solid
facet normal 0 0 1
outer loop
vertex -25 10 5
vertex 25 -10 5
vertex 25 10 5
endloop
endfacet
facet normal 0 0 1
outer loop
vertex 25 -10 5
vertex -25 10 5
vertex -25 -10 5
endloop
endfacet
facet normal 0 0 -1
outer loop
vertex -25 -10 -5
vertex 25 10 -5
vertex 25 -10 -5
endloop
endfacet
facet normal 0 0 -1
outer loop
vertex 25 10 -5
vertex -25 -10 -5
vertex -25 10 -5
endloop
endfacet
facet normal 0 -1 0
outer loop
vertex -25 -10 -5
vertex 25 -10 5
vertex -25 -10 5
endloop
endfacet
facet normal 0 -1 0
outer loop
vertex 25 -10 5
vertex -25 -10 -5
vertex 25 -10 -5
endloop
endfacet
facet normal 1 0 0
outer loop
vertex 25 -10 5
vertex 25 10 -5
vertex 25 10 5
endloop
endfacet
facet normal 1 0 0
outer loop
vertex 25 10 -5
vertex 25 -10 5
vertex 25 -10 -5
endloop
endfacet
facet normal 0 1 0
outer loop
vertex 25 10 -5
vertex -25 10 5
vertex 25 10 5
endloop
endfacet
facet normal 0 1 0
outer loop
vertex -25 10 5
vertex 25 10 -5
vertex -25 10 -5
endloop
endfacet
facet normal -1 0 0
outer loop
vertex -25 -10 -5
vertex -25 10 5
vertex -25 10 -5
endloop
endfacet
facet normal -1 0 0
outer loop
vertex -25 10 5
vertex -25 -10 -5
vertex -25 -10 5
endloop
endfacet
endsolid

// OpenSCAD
module component_name_1() {
    // Adjusted dimensions of the rectangular prism to match the original model
    length = 50;  // Length of the prism remains the same
    width = 20;   // Increased width to make the model wider
    height = 10;  // Increased height to make the model thicker

    // Create the rectangular prism with sharper edges
    cube([length, width, height], center = true);
}

// Main function to render the model
// Adjusted orientation to align with the original model
rotate([0, 0, 0])  // No rotation applied to match the original orientation
component_name_1();
